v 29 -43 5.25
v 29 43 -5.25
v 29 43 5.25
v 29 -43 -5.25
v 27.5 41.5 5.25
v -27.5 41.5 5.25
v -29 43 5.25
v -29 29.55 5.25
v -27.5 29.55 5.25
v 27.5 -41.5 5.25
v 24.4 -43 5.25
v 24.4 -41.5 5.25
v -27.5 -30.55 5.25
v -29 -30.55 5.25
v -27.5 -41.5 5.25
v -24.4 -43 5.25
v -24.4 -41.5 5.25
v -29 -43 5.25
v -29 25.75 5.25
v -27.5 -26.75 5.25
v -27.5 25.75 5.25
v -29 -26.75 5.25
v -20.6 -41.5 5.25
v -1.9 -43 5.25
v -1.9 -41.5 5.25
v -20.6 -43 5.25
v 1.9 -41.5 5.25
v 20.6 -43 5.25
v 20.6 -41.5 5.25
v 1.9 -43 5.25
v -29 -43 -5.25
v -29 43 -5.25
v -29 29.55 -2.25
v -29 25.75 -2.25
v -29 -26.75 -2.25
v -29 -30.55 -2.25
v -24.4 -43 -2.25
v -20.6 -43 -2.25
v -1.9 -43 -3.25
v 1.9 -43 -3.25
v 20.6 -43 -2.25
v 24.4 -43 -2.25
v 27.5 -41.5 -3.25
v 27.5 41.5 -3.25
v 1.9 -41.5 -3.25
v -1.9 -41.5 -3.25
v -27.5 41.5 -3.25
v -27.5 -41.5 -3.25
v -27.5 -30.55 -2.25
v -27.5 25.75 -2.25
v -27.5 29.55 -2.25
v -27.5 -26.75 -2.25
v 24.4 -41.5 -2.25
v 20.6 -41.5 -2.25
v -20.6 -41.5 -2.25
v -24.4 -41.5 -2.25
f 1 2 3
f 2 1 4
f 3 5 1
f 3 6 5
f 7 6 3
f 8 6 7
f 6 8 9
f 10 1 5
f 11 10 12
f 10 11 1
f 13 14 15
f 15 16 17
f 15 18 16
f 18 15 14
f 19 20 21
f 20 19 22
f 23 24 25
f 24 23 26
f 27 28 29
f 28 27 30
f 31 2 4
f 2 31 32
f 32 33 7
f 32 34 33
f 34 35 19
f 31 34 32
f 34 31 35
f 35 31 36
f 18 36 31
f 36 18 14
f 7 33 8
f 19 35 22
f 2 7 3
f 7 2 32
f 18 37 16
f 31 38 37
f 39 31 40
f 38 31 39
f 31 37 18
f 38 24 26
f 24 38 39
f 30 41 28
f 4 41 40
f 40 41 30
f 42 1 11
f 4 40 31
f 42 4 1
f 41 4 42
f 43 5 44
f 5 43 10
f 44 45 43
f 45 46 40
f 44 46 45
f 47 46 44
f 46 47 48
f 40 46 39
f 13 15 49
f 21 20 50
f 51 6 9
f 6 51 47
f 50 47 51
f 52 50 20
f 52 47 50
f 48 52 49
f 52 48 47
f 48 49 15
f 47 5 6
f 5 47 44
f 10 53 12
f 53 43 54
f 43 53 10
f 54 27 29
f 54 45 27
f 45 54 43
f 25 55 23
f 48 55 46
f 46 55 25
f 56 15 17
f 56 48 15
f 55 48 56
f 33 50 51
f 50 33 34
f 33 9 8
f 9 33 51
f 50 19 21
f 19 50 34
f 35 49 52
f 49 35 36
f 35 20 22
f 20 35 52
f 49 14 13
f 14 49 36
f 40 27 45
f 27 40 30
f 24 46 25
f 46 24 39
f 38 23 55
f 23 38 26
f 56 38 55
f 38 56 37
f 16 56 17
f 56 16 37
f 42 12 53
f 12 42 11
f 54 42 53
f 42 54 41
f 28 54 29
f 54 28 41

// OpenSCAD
// file: ../robot_settings.scad
main_box_x = 95; // 96
main_box_y = 102;
main_box_z = 74; // 74.5
wall_thickness = 2;

rail_gap = 2;
rail_inset = 7;

rail_thickness = 7;
rail_length = 250;
rail_width = 200;

raspberry_pi_screw_seperation_y = 57;
raspberry_pi_screw_seperation_z = 48;
raspberry_pi_peg_h = 4;

gears_module = 1;
pinion_gear_teeth = 30;
pinion_gear_width = 5;
pinion_gear_bore = 4;

gears_setback_distance = 25;
gear_post_height = 2 * pinion_gear_width + rail_thickness + 8 ;

steering_motor_mount_x = 45;
steering_motor_mount_y = 36;
steering_motor_mount_z = 18;
steering_motor_mount_setback_distance = gears_setback_distance + 16;

dc_motor_housing_minus_encoder_z = 48;
dc_motor_encoder_z = 9.33;
dc_motor_encoder_wheel_d = 13.4;
dc_motor_encoder_wheel_thickness = 5;
dc_motor_encoder_wheel_gap = 3;
dc_motor_encoder_circuit_thickness = 2;
dc_motor_cutout_d = 24.8;
dc_motor_cutout_z = 19.5;

dc_motor_screw_head_z = 2;
dc_motor_screw_head_d = 5.6;
dc_motor_screw_d = 3.2;
dc_motor_screw_offset = 8.5;

dc_motor_axle_ring_z = 3;
dc_motor_axle_ring_d = 7.2;
dc_motor_axle_cutout_d = 4.5;
dc_motor_axle_cutout_z = 10;
dc_motor_axle_notch_cutout = 0.4;
dc_motor_axle_notch_cutout_z = 6;

drv8871_x = 20.3;
drv8871_y = 24;
drv8871_z = 2;
drv8871_screw_d = 2.5;
drv8871_screw_distance = 15.64;
drv8871_solder_points_z = 2;
drv8871_solder_points_d = 1.66;
drv8871_solder_offset_y = 4.4;
drv8871_solder_inner_points_distance = 5;
drv8871_solder_outer_points_distance = 12;

drv8871mount_edge_x = 1.5;
drv8871mount_edge_wall = 3;
drv8871mount_z = 5;
drv8871mount_x = drv8871_x +  drv8871mount_edge_wall - 2* drv8871mount_edge_x;
drv8871mount_y = 19;

pdmount_x = 20;
pdmount_y = 30;
pdmount_z = 2;
pdmount_edge_x = 1.5;
pdmount_edge_wall = 3;

steering_shaft_z = gear_post_height + dc_motor_axle_ring_z + pinion_gear_width + 15;
steering_shaft_d = 7;
steering_shaft_motor_fitting_d = 9;

lidar_mount_y = 110;
lidar_mount_x = 65 + 20;
lidar_narrow_screws = 40;
lidar_wide_screws = 56;
lidar_front_to_back_screws = 70;
lidar_screw_d = 3;
lidar_circuitboard_x = 20;
lidar_circuitboard_y = 35;
lidar_circuitboard_z = 1.2;
lidar_cord_length = 55;

ball_bearing_height = 7;
ball_bearing_outer_diameter = 22;
ball_bearing_inner_diameter = 8;

pull_bar_radius = 3.3;

rack_module = 1;
rack_length = main_box_x / 2;
rack_height = 10;
rack_width = 10;
rack_teeth = 30;
rack_bore = 3;

// tire hardware
axle_length = 30;
axle_reciever_inner_diameter = 7.75;
axle_reciever_length = 18.8;
axle_notch_length = 7;
axle_notch_cutout = 2.4;

// power distribution bar
power_bar_cutout_x = 96;
power_bar_y = 19.1;
power_bar_z = 1.5;
power_bar_screw_distance = 91.4;
power_bar_screw_d = 2.8;
power_bar_standoff_z = 5;
power_bar_standoff_d = 6.83;

// breadboard
breadboard_wall_thickness = 3;
breadboard_width = 55;
breadboard_length = 83;
breadboard_height = 10.5;
breadboard_notch_width = 3.8;
breadboard_longside_notch_separation = 58.2 - breadboard_notch_width / 2;
breadboard_shortside_notch_separation = 26.3 - breadboard_notch_width;
// main file
   include <../robot_settings.scad>
   
   module breadboard_mount() {
      difference() {   
     cube([breadboard_width + breadboard_wall_thickness, breadboard_length + breadboard_wall_thickness, breadboard_height], center = true);
     
     translate([0, 0, wall_thickness])
     cube([breadboard_width, breadboard_length, breadboard_height], center = true);
   
     translate([-breadboard_width / 2, breadboard_longside_notch_separation / 2 - 0.5, breadboard_wall_thickness])
     cube([2 *breadboard_wall_thickness, breadboard_notch_width, breadboard_height], center = true);
     
       // right longside notch
      translate([-breadboard_width / 2, -breadboard_longside_notch_separation / 2 - 0.5, breadboard_wall_thickness])
      cube([2 *breadboard_wall_thickness, breadboard_notch_width, breadboard_height], center = true);
     
     translate([0, -breadboard_length / 2, wall_thickness])
     cube([breadboard_notch_width, 2 *breadboard_wall_thickness, breadboard_height], center = true);
     
     translate([-breadboard_shortside_notch_separation, -breadboard_length / 2, breadboard_wall_thickness])
     cube([breadboard_notch_width, 2 *breadboard_wall_thickness, breadboard_height], center = true);
     
     translate([breadboard_shortside_notch_separation, -breadboard_length / 2, breadboard_wall_thickness])
     cube([breadboard_notch_width, 2 *breadboard_wall_thickness, breadboard_height], center = true);
  }
}
breadboard_mount();
